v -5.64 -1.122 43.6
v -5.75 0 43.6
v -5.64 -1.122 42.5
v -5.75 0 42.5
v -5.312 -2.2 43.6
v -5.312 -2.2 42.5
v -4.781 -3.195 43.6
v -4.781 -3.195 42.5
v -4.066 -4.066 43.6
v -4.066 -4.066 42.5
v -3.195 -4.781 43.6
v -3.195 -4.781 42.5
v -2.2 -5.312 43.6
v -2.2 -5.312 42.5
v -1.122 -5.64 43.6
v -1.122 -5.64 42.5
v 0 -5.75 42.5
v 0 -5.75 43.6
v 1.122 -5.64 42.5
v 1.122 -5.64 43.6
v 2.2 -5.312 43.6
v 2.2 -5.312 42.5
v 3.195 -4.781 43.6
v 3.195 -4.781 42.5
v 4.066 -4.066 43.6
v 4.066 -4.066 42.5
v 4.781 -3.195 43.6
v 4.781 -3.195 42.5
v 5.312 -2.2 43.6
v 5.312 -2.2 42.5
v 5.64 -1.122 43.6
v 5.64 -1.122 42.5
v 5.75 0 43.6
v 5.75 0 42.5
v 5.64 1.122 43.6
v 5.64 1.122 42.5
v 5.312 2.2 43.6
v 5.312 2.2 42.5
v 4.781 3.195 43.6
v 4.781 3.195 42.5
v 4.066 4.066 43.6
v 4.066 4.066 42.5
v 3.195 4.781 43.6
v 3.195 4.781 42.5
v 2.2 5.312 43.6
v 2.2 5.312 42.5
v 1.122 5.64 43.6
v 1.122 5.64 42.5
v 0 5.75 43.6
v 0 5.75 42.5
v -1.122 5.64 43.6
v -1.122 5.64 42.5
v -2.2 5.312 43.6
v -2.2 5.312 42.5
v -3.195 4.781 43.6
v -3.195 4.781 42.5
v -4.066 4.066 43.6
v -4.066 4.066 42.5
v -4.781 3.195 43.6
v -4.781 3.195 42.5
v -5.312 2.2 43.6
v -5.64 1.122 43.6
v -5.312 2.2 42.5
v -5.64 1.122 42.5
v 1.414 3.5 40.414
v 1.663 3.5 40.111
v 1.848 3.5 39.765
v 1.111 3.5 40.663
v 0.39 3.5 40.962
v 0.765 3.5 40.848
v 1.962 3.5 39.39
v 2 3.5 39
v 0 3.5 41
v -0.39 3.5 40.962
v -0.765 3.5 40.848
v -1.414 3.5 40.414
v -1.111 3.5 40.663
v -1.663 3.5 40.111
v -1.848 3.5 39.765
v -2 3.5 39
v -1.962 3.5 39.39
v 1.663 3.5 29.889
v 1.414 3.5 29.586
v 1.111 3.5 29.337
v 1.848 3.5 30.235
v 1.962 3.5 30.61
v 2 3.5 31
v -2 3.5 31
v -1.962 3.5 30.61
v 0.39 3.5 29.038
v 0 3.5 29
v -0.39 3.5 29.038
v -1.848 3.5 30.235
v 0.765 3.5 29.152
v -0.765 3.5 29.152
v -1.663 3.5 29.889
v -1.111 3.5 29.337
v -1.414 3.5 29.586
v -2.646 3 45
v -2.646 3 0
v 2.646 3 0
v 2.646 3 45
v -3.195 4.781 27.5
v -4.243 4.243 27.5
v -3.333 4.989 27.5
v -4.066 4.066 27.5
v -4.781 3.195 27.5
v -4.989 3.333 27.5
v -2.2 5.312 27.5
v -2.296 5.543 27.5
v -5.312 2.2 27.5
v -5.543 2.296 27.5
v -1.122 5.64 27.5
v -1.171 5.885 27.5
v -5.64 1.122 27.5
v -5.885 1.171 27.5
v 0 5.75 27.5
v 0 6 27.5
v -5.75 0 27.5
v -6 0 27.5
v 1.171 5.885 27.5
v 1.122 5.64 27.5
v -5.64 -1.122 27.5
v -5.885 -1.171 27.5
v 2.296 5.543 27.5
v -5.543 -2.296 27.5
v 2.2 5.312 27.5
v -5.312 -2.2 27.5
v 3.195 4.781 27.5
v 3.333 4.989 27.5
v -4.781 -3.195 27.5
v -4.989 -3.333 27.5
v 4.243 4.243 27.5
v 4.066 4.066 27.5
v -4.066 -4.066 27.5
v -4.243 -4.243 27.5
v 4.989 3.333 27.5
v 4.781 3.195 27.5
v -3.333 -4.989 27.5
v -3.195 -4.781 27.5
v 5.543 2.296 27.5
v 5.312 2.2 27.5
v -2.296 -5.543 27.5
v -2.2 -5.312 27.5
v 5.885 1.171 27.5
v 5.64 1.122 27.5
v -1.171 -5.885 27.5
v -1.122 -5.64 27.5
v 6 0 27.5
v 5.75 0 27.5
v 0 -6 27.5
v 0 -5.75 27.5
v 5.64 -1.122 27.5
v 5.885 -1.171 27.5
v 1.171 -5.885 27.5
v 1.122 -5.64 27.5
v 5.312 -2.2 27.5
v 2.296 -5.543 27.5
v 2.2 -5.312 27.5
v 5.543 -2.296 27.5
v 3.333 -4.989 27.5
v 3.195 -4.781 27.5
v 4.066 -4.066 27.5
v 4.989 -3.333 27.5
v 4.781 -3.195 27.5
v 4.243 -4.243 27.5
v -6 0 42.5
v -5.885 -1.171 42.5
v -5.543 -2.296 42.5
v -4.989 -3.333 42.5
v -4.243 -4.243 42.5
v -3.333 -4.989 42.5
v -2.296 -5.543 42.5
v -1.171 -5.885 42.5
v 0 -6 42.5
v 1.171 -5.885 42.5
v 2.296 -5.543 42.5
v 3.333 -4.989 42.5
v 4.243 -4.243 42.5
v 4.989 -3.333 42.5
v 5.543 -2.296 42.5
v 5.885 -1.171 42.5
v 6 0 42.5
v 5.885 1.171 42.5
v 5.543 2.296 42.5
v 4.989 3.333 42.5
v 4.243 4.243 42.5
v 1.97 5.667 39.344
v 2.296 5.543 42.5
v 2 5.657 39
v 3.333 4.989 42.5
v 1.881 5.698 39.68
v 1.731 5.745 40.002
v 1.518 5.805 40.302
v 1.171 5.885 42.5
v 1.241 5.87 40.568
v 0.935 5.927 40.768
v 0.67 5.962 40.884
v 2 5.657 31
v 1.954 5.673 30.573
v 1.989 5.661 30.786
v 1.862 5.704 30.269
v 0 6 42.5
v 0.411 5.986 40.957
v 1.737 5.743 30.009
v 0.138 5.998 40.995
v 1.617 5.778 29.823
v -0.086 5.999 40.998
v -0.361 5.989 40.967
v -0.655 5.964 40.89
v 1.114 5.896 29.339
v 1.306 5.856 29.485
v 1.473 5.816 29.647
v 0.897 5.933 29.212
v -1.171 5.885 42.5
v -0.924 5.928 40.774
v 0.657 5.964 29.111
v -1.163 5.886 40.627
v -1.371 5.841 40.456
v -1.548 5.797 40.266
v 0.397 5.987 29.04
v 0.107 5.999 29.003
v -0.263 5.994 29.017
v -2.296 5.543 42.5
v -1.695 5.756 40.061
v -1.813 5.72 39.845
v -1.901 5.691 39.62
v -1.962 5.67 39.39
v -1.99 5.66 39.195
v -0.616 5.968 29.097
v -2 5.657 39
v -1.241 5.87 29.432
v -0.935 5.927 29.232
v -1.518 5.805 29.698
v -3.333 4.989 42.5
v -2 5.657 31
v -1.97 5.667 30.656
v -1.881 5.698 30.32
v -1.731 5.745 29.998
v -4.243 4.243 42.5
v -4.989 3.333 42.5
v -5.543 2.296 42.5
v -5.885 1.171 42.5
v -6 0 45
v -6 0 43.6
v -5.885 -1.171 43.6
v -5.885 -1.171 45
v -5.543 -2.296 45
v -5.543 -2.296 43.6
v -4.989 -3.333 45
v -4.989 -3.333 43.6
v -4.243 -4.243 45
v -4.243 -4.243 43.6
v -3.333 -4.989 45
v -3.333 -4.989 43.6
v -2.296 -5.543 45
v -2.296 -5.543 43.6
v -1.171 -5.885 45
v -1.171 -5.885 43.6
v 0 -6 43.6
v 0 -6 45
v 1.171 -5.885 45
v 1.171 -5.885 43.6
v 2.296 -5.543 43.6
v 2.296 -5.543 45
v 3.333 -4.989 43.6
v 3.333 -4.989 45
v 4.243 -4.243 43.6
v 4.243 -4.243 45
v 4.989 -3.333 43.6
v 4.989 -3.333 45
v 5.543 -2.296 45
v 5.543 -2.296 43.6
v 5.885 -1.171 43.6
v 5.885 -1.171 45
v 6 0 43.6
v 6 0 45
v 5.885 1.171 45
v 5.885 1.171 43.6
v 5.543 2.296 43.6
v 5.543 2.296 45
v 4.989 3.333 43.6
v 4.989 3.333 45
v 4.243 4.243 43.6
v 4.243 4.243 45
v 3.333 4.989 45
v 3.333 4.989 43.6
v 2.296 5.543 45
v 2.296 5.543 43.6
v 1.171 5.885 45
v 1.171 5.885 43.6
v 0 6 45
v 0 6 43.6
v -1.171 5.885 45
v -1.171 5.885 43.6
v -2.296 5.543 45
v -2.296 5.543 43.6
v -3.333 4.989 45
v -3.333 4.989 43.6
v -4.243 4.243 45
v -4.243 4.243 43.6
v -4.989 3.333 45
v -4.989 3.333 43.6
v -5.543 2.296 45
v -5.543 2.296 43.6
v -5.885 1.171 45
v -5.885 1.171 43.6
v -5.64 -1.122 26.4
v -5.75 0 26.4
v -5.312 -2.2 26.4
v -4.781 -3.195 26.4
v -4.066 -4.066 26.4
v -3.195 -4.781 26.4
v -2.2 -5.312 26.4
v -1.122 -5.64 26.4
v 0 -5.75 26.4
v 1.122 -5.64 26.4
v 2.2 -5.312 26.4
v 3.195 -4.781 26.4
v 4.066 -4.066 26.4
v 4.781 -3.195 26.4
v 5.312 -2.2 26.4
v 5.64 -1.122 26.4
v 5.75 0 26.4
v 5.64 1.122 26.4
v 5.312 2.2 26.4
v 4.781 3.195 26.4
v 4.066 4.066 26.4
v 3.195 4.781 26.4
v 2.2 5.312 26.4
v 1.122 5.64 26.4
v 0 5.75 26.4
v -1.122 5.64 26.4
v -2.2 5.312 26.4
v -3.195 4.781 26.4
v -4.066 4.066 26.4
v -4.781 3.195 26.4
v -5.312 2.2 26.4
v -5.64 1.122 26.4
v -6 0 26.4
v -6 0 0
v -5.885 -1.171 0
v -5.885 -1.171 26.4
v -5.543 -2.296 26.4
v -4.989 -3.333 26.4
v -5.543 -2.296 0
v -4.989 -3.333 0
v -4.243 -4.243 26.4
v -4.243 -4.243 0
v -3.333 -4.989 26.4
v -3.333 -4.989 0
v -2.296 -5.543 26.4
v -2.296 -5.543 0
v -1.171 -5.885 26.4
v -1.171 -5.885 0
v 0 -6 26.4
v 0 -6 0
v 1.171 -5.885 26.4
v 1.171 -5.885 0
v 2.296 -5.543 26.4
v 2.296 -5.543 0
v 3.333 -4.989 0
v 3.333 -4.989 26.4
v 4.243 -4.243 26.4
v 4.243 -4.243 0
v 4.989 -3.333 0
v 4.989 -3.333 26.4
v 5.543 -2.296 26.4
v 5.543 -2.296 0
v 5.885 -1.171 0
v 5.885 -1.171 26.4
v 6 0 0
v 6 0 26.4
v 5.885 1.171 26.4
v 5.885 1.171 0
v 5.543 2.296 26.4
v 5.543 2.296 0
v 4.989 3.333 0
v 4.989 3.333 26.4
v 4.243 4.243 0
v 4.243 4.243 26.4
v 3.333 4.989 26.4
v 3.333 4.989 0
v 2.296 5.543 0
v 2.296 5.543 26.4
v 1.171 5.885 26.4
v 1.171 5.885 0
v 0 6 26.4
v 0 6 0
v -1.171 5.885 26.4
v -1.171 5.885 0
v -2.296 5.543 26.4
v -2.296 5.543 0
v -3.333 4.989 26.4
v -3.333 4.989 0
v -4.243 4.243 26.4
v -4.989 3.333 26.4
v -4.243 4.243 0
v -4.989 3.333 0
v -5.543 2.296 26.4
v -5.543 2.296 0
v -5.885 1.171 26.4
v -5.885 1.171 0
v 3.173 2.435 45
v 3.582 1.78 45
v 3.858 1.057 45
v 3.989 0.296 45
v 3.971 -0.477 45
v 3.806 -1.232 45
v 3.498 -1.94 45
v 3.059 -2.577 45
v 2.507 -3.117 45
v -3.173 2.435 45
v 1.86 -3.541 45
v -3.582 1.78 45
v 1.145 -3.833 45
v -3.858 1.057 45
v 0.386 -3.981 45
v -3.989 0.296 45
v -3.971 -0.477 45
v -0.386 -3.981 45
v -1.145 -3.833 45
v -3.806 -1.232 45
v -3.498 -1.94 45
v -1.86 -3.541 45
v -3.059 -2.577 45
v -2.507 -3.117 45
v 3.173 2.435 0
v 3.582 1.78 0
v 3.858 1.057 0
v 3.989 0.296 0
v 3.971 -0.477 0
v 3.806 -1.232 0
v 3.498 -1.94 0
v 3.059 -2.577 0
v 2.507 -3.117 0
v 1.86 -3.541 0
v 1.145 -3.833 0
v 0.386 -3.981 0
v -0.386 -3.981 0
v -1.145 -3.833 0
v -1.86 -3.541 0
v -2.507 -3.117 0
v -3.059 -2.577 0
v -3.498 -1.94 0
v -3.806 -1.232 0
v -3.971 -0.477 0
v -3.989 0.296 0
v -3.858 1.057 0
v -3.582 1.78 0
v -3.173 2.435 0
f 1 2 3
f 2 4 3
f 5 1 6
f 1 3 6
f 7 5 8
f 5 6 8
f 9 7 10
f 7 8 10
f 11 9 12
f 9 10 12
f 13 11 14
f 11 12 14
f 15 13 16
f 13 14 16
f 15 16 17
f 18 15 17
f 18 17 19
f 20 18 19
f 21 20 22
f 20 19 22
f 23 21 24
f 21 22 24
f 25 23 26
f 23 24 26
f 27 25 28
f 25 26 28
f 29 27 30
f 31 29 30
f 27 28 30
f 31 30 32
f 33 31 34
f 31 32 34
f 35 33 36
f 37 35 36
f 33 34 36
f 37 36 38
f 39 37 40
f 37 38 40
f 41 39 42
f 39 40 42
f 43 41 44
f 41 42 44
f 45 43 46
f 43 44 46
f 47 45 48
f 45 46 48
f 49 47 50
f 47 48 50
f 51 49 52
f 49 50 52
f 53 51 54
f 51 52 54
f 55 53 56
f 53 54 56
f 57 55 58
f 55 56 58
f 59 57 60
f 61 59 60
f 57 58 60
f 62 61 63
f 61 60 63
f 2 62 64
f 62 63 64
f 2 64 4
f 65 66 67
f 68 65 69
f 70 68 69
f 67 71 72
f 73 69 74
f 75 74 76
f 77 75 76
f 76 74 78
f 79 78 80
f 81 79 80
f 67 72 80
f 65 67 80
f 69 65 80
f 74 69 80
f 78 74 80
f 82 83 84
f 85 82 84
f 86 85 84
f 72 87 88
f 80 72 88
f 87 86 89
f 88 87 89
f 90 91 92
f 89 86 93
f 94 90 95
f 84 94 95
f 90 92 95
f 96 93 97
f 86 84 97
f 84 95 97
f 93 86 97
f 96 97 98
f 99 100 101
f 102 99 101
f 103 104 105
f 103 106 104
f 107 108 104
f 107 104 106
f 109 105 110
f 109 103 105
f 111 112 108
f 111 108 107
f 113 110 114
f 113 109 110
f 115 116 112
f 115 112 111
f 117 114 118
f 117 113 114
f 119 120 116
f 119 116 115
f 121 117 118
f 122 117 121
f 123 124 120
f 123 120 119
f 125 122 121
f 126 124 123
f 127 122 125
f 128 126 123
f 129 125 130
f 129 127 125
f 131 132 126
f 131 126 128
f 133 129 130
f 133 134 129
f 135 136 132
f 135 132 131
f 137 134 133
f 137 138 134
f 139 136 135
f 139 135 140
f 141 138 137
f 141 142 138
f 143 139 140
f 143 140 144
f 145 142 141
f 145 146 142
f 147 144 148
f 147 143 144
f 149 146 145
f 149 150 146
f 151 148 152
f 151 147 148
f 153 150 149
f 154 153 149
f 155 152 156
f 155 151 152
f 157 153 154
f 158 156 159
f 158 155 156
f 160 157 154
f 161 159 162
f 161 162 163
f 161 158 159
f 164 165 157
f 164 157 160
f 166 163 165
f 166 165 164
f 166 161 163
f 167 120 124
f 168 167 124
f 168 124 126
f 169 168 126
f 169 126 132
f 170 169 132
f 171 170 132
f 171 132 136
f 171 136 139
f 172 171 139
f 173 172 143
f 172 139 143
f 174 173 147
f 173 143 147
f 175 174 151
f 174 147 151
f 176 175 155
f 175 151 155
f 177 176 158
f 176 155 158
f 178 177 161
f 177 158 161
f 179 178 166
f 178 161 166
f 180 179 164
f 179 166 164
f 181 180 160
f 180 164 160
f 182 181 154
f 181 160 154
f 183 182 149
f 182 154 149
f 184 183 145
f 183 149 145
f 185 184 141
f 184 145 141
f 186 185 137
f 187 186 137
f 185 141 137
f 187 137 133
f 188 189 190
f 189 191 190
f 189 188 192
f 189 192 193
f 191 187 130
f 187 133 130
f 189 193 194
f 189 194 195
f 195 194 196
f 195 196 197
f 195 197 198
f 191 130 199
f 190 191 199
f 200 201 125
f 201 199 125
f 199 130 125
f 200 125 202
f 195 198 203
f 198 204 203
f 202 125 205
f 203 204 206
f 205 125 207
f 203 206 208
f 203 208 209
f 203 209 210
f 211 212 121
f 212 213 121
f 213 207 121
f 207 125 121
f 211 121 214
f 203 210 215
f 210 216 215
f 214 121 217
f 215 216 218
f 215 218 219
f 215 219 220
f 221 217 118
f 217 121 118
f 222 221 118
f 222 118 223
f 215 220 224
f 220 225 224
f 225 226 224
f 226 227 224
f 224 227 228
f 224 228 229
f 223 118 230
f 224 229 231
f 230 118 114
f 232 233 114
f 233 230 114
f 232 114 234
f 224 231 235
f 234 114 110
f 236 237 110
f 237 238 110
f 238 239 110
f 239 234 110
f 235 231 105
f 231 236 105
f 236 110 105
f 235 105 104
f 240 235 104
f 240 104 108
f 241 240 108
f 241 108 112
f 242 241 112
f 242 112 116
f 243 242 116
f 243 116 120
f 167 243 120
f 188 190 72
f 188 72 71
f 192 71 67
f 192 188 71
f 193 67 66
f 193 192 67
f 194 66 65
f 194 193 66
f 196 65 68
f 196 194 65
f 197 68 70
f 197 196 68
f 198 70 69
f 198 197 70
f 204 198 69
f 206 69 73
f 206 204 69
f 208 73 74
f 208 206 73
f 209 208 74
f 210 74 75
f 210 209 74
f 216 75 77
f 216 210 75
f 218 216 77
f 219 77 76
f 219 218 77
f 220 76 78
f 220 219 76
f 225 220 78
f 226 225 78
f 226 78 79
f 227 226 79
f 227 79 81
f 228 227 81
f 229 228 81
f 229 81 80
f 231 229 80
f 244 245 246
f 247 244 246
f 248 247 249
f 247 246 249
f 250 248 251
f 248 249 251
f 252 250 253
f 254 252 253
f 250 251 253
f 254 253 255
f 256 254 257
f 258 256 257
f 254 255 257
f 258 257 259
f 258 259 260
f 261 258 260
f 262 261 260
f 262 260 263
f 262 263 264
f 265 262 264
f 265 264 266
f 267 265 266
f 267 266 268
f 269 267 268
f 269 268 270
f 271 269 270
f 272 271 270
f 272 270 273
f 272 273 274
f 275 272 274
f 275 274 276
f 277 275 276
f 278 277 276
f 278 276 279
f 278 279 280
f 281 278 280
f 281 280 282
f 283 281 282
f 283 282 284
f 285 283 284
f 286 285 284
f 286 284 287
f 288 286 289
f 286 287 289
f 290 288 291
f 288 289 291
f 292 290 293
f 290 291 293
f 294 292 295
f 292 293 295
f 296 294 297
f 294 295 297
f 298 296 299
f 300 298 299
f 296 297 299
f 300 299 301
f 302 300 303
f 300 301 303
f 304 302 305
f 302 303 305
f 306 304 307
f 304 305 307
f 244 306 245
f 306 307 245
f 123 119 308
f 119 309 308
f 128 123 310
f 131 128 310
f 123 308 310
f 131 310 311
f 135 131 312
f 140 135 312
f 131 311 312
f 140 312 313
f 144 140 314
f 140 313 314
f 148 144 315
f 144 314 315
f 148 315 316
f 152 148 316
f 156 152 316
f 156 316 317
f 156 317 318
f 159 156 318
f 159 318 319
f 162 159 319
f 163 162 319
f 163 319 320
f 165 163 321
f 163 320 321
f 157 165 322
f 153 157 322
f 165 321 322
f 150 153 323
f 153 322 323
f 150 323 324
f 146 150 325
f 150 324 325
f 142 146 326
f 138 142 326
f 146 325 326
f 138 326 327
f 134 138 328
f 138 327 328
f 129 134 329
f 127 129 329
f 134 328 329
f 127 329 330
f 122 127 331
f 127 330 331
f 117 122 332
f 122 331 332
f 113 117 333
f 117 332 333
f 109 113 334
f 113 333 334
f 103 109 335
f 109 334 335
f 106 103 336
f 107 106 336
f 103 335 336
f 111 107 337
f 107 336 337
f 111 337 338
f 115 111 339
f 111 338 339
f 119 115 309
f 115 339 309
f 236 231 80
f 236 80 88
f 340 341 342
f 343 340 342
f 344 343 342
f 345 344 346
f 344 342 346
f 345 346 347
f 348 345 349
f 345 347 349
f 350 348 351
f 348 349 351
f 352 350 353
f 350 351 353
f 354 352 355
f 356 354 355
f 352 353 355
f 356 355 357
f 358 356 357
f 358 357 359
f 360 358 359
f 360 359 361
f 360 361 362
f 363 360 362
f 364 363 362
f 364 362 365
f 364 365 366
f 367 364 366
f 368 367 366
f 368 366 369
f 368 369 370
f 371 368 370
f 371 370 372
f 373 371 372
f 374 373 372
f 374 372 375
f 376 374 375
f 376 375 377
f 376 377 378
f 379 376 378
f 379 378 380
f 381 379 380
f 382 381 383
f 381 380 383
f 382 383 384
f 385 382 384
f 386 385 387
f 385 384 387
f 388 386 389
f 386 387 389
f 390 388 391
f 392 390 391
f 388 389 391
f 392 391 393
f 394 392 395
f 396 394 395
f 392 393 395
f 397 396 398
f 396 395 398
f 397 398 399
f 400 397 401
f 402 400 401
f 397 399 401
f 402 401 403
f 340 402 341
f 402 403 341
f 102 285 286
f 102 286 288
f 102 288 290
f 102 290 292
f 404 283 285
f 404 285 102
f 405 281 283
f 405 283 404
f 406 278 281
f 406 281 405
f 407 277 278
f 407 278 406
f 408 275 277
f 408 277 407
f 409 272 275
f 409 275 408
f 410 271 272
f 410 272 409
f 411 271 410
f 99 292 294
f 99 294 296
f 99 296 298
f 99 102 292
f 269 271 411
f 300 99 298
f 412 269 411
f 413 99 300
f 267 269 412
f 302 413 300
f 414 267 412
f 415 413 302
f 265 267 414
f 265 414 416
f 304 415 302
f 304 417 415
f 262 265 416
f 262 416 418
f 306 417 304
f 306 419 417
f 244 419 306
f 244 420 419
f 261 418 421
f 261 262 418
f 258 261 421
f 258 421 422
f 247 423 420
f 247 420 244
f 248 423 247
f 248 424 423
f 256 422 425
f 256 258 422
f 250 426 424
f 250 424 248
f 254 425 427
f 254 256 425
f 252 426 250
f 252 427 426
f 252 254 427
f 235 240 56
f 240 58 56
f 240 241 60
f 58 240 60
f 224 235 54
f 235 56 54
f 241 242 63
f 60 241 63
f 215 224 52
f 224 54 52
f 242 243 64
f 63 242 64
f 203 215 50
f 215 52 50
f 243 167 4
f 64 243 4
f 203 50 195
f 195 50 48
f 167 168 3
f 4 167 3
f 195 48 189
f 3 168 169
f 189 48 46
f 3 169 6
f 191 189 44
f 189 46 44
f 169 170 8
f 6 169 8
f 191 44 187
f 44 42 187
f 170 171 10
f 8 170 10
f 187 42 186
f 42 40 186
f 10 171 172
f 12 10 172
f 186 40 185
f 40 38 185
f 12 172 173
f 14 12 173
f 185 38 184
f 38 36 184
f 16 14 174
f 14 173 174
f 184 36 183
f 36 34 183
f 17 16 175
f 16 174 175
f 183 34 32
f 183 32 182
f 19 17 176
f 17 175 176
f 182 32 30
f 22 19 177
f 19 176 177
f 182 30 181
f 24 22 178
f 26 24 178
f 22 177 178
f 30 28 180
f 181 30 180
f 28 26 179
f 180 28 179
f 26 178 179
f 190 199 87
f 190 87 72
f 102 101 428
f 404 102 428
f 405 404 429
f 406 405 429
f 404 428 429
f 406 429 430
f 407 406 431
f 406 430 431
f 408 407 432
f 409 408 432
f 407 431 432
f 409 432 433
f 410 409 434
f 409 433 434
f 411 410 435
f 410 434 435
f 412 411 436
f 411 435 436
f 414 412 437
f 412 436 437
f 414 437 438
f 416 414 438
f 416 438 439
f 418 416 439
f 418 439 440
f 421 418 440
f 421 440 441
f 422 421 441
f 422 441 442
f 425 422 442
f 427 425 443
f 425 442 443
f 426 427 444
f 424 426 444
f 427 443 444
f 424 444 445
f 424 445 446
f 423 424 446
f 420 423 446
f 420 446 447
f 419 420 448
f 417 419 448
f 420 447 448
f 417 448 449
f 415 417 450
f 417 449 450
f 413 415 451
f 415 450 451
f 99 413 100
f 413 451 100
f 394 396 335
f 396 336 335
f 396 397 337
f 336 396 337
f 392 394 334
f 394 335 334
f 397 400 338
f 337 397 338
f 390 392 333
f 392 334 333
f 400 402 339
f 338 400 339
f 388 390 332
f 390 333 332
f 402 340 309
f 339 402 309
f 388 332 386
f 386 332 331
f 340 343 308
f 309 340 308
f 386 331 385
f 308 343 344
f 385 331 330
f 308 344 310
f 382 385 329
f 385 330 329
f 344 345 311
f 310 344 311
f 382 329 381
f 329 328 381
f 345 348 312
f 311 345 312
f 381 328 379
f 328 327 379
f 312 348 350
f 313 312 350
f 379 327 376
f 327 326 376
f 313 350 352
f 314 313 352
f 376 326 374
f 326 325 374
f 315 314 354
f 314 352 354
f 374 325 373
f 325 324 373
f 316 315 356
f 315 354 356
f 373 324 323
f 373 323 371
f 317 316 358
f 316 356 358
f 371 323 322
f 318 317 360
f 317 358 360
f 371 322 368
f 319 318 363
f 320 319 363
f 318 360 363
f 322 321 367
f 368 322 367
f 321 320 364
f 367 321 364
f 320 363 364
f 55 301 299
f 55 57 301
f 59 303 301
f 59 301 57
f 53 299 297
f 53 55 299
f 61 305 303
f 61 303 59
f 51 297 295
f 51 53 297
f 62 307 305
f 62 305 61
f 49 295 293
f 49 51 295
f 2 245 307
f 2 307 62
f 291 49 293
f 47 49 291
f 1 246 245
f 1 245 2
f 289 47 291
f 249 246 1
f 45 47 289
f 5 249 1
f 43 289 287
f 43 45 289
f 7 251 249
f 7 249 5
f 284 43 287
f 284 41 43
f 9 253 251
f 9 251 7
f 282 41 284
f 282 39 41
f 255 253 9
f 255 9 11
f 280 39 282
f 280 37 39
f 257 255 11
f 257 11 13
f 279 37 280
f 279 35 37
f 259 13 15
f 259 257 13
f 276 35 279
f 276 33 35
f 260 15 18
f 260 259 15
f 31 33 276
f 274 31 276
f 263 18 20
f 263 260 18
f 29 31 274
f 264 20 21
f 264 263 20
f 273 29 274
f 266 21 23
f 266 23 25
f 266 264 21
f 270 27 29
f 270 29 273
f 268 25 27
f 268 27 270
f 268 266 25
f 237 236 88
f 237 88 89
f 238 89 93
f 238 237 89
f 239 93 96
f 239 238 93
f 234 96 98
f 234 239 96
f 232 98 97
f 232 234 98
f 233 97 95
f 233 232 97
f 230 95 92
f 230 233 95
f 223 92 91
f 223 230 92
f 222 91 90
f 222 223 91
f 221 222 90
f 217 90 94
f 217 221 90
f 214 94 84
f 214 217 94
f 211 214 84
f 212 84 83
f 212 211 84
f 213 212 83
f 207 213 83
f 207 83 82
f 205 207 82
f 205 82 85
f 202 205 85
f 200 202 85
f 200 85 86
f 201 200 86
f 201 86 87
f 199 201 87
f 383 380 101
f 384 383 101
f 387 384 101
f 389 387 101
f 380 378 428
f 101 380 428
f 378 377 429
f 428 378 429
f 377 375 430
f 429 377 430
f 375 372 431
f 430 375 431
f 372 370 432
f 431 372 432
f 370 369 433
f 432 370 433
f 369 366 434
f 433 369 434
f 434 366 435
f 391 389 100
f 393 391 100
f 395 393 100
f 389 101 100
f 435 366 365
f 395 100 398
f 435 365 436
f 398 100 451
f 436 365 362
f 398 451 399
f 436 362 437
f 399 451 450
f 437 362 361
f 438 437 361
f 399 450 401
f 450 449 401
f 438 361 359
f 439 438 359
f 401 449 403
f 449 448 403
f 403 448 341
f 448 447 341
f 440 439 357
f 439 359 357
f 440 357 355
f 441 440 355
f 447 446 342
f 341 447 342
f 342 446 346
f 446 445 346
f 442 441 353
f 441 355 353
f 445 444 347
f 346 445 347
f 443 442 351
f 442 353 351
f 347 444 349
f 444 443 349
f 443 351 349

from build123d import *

# Parameters (mm, degrees)
ESBO_O1_R                = 6
RESSALTO_EXTRUS_O1_DEPTH = 45
CORTE_EXTRUS_O1_DEPTH    = 2.5
ESBO_O3_W                = 1.1
ESBO_O3_H                = 0.25


with BuildPart() as part:
    # Esboço1 → Ressalto-extrusão1 (new body)
    with BuildSketch(Plane.XY):
        with Locations(Location((0, 0, 0), (0, 0, 180))):
            Circle(ESBO_O1_R)
        with BuildLine():
            Line((-2.645751311, 3), (2.645751311, 3))
            ThreePointArc((2.645751311, 3), (0, -4), (-2.645751311, 3))
        make_face(mode=Mode.SUBTRACT)
    extrude(amount=RESSALTO_EXTRUS_O1_DEPTH)

    # Esboço2 → Corte-extrusão1 (cut)
    with BuildSketch(Plane(origin=(0, 6, 0), x_dir=(1, 0, 0), z_dir=(0, 1, 0))):
        with BuildLine():
            Line((-2, -39), (-2, -31))
            ThreePointArc((-2, -31), (0, -29), (2, -31))
            Line((2, -31), (2, -39))
            ThreePointArc((2, -39), (0, -41), (-2, -39))
        make_face()
    extrude(amount=-CORTE_EXTRUS_O1_DEPTH, mode=Mode.SUBTRACT)

    # Esboço3 → Corte-Revolução1 (revolve, cut)
    with BuildSketch(Plane(origin=(0, 0, 0), x_dir=(0, 0, -1), z_dir=(1, 0, 0)), mode=Mode.PRIVATE) as corte_revolu_o1_sk:
        with Locations((-26.95, 5.875)):
            Rectangle(ESBO_O3_W, ESBO_O3_H)
        with Locations((-43.05, 5.875)):
            Rectangle(ESBO_O3_W, ESBO_O3_H)
    revolve(corte_revolu_o1_sk.sketch.rotate(Axis((0, 0, 0), (0, 0, 1)), 90), axis=Axis((0, 0, 0), (0, 0, 1)), mode=Mode.SUBTRACT)


solid = part.part
